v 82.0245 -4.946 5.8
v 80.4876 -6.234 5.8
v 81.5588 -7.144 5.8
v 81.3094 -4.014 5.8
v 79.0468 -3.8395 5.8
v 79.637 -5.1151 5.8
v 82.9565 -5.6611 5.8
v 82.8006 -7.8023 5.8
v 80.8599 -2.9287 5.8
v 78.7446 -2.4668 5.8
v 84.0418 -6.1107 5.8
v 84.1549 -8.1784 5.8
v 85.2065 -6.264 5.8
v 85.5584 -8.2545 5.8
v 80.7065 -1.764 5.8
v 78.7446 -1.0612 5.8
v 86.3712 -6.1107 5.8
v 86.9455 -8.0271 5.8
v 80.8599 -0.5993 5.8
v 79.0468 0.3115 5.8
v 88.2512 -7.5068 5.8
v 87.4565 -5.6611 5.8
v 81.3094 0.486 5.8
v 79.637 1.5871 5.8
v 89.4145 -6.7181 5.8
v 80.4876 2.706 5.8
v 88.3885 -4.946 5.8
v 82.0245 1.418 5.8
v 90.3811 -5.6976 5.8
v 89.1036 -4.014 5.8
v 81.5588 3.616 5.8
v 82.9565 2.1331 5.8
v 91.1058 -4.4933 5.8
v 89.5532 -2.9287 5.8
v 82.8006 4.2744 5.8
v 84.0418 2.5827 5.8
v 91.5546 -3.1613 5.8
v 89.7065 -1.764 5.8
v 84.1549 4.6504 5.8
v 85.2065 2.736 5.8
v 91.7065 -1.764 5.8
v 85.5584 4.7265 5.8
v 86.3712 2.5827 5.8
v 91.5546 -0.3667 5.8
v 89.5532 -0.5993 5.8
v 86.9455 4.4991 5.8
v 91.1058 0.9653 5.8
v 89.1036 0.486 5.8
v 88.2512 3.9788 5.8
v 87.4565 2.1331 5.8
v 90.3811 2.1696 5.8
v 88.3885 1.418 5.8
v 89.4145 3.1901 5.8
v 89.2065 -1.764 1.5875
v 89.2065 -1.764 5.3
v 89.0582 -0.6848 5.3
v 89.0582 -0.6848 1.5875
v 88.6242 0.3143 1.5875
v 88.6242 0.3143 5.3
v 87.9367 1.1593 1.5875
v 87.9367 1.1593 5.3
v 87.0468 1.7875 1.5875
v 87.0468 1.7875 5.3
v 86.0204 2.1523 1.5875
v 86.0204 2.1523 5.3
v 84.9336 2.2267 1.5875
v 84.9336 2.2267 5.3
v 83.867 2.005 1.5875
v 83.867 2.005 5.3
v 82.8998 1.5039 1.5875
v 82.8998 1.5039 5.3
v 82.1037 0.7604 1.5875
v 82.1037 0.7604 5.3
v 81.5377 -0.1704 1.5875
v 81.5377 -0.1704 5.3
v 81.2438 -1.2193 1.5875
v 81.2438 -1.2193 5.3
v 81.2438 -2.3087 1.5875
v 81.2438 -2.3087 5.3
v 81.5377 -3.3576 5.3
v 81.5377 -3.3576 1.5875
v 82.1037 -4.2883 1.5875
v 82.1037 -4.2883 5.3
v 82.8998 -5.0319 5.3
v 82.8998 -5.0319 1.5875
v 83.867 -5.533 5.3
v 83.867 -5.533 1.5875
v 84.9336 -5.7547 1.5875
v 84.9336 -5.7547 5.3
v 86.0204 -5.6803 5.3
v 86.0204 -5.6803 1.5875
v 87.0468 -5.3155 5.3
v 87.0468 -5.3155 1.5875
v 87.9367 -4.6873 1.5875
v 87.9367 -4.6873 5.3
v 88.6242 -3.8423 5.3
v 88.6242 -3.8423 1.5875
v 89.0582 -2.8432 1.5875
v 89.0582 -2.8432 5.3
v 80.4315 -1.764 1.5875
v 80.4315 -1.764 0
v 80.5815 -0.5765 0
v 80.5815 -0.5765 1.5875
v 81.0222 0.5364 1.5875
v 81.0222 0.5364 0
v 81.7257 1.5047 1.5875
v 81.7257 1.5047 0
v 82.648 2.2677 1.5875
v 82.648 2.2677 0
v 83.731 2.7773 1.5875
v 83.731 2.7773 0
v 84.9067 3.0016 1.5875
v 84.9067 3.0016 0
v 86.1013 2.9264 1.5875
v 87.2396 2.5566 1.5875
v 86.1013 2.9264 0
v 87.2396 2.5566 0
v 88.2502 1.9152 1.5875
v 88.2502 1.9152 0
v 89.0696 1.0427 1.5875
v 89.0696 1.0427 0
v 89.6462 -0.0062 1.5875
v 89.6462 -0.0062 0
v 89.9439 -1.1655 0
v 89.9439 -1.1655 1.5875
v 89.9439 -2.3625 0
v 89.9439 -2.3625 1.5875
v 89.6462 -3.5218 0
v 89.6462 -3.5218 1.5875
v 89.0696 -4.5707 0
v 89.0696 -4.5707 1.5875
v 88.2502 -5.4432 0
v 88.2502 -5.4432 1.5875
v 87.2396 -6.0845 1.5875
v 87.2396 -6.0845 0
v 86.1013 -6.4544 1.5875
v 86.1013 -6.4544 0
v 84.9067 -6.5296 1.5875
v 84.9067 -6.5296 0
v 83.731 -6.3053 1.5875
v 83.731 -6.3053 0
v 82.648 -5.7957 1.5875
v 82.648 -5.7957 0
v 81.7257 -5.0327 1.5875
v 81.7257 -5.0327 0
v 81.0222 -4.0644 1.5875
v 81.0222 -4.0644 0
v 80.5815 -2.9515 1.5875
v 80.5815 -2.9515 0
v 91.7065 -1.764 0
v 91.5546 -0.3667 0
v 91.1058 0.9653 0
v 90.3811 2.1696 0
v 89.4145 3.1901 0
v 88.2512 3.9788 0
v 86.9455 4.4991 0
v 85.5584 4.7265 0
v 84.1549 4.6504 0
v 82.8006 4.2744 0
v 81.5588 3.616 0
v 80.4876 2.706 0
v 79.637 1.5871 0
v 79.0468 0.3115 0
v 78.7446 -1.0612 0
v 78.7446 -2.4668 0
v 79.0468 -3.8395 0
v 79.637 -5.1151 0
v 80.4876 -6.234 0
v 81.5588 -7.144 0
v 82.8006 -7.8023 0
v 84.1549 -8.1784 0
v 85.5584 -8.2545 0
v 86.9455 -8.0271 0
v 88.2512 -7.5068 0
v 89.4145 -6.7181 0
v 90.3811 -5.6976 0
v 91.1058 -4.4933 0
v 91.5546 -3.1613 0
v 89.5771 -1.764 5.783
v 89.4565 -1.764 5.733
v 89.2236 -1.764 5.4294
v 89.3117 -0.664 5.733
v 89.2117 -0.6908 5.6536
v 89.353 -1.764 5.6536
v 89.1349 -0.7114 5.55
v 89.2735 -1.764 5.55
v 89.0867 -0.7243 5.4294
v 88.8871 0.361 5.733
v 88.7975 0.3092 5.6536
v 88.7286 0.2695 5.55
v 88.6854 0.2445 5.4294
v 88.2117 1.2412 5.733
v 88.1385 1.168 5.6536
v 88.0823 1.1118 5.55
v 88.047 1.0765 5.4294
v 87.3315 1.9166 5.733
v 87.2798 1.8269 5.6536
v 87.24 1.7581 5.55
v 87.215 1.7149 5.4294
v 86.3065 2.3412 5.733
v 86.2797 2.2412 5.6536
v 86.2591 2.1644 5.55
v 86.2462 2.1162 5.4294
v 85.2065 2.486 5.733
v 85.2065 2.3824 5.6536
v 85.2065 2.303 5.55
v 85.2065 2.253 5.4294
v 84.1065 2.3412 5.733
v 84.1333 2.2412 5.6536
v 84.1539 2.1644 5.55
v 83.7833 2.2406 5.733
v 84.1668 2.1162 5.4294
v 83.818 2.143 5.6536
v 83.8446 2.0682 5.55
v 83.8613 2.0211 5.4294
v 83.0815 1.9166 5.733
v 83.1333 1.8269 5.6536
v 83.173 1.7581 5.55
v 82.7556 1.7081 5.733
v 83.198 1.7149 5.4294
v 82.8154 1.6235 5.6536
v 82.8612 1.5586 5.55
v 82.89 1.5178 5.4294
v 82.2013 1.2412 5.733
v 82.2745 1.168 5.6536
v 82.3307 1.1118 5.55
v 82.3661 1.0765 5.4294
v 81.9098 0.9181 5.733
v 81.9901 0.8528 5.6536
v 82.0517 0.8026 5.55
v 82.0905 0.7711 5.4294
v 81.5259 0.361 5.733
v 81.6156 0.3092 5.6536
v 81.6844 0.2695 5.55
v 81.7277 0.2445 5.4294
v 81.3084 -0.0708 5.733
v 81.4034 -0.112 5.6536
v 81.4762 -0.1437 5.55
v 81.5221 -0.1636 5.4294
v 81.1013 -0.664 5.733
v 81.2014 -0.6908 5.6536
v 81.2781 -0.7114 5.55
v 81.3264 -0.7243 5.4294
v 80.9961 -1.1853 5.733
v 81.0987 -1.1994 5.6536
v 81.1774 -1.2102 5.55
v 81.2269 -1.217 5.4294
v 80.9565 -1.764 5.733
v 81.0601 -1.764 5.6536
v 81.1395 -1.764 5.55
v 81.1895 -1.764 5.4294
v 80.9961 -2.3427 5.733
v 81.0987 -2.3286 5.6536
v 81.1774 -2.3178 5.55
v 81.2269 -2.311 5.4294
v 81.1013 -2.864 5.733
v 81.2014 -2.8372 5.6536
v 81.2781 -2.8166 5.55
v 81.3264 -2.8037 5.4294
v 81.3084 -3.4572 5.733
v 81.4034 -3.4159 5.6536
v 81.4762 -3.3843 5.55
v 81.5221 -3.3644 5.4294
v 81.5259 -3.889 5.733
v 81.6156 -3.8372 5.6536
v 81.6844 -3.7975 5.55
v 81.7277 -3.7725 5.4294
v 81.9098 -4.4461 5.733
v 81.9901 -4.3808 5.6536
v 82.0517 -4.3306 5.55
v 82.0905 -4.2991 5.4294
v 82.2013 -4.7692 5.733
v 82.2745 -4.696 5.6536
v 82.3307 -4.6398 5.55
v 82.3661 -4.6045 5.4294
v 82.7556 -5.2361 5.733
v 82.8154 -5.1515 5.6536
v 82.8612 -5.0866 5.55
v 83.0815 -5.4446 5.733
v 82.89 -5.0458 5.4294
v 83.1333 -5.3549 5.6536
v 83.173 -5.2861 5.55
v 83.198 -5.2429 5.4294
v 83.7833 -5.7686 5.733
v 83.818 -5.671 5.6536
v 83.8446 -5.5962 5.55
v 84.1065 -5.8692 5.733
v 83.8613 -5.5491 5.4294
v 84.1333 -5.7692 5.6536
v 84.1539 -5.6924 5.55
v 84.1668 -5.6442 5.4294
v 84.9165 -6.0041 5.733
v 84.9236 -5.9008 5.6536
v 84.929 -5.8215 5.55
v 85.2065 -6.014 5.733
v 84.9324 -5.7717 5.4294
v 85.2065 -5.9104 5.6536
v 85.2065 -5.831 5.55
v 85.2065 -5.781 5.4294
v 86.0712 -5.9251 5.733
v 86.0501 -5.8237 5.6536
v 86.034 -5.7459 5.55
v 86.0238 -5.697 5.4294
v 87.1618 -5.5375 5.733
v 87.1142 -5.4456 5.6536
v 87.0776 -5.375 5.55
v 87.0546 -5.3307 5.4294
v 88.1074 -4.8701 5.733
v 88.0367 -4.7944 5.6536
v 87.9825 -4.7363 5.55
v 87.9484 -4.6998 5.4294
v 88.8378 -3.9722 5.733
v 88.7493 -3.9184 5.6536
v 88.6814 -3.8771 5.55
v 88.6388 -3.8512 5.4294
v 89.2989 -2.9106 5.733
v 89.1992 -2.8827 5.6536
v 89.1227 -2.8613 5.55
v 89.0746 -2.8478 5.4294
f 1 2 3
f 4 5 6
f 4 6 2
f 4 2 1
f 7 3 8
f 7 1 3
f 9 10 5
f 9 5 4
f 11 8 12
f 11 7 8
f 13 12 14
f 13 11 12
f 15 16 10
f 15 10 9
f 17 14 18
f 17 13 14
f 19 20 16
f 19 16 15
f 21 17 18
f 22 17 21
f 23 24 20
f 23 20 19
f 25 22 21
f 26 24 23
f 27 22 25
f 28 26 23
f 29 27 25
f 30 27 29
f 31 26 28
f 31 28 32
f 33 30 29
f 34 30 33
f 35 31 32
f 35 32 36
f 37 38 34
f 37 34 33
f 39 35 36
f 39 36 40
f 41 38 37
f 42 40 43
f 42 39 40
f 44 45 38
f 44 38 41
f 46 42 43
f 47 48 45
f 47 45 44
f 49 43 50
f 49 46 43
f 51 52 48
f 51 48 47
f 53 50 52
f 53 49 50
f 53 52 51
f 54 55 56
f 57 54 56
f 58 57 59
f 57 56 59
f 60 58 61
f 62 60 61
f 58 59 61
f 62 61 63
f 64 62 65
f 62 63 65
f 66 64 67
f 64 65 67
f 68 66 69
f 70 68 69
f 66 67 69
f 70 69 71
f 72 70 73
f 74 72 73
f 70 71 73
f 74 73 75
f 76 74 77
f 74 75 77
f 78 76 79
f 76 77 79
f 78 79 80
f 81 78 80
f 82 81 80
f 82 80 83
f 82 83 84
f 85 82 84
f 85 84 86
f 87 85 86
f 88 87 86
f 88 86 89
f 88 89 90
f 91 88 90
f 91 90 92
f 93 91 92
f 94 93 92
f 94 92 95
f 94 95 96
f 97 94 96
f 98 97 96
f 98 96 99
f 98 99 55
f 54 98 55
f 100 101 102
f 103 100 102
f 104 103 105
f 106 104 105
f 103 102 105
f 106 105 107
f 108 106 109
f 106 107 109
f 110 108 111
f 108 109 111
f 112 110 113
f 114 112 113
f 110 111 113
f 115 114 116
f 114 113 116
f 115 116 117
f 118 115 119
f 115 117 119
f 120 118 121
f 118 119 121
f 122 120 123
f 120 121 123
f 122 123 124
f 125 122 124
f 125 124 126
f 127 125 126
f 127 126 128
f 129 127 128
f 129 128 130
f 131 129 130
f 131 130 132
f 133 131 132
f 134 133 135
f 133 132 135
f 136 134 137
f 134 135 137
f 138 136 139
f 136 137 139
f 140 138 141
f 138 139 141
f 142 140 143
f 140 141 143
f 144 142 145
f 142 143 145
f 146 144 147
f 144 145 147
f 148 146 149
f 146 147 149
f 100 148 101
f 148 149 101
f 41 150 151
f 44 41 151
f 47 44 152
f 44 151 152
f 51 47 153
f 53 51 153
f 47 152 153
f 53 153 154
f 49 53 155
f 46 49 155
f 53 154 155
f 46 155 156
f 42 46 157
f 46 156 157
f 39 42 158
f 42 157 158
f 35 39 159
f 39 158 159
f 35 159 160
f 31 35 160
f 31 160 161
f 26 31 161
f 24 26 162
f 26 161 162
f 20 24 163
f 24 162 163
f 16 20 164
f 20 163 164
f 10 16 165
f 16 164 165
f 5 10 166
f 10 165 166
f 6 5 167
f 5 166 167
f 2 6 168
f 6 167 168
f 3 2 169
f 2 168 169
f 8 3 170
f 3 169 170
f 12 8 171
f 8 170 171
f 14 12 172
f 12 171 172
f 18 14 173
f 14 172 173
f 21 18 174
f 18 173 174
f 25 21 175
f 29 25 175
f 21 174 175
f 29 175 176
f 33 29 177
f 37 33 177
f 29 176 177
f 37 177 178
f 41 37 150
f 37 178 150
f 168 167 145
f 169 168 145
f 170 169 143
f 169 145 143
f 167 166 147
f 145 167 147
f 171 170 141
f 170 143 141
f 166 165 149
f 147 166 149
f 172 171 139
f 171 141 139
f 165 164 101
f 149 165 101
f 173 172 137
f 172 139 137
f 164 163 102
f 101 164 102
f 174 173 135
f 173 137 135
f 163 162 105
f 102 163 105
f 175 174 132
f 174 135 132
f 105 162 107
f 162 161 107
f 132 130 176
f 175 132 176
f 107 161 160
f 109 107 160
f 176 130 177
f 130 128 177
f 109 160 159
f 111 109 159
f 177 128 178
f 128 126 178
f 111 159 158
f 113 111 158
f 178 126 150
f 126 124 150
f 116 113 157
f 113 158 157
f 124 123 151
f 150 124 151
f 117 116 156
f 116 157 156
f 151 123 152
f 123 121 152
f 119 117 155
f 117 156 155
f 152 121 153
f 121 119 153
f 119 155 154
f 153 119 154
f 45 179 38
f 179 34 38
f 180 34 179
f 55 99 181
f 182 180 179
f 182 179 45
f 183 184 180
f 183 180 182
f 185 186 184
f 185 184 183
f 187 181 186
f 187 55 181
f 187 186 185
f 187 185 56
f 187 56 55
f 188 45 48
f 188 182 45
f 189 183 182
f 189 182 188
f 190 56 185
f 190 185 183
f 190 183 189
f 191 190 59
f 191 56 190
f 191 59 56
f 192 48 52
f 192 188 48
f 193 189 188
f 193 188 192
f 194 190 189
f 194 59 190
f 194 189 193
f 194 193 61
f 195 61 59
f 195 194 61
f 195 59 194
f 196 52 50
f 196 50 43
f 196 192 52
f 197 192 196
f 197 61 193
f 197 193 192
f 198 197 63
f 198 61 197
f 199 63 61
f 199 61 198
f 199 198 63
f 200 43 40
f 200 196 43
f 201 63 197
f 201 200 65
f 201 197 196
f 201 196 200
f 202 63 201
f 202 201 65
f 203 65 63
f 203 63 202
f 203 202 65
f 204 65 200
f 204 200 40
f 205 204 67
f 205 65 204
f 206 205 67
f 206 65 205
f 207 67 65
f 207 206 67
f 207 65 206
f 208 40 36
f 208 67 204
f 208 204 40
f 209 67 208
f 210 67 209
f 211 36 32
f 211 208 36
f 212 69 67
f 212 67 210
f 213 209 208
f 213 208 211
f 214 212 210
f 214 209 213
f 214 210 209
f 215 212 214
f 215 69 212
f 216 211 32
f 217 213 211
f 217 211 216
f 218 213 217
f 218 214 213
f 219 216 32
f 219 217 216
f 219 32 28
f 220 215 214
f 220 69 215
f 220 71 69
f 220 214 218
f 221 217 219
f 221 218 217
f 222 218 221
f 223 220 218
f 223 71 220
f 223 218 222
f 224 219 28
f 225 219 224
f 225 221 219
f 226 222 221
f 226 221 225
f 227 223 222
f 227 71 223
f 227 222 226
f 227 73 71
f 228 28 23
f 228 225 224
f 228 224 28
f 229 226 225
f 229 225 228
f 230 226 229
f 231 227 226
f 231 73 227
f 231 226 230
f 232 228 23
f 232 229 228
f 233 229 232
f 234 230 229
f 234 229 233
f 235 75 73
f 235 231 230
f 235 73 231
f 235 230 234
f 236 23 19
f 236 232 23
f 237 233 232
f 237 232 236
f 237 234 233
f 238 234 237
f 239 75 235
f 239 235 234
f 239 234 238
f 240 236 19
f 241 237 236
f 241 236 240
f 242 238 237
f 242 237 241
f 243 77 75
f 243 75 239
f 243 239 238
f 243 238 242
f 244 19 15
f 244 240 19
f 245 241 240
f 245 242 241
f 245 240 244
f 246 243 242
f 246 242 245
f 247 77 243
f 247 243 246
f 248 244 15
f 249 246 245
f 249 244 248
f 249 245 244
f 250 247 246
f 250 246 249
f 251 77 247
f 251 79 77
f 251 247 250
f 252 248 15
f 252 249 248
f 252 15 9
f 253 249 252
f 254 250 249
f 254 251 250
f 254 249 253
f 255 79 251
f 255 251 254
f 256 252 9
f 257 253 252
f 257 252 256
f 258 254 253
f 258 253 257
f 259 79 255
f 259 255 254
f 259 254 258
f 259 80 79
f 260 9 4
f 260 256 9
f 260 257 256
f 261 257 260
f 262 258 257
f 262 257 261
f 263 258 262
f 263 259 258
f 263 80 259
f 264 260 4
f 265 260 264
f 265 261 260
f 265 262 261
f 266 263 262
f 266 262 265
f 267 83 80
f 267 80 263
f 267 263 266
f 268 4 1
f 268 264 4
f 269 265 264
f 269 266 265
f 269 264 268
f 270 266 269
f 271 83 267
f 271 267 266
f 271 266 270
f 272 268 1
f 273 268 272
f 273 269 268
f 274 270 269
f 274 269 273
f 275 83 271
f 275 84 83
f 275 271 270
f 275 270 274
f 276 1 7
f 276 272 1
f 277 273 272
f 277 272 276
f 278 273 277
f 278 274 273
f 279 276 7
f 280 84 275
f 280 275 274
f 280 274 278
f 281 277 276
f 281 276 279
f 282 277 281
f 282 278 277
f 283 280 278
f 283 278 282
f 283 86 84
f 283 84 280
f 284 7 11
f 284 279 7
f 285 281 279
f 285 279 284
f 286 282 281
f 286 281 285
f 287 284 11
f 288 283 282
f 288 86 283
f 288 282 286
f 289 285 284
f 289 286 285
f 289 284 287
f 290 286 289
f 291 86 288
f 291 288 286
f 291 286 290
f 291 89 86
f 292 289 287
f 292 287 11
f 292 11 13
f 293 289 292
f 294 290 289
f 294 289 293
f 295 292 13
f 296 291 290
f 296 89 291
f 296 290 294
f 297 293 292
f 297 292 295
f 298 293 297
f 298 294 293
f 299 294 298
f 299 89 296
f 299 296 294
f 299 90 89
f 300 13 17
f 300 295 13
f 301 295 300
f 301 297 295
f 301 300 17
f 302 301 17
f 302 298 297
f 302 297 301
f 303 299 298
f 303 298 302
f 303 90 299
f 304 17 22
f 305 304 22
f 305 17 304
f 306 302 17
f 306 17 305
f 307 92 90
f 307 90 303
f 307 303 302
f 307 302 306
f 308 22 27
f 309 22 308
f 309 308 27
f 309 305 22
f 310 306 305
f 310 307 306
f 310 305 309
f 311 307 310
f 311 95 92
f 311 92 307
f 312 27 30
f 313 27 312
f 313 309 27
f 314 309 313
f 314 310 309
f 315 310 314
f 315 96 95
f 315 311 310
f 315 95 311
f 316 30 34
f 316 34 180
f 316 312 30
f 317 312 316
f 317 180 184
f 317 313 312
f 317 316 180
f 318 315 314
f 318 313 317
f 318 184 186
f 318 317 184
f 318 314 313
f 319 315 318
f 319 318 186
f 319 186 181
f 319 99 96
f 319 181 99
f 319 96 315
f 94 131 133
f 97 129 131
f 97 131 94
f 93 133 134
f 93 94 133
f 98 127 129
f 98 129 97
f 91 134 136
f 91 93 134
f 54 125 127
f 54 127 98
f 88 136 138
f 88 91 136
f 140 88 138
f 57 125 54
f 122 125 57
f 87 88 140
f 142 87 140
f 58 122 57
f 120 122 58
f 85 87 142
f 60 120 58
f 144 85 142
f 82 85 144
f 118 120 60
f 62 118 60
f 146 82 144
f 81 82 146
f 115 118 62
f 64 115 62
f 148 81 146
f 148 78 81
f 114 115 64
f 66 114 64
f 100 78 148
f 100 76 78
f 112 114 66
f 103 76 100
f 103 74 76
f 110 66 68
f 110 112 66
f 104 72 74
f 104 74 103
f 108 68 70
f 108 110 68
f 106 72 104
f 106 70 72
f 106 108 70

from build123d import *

# Parameters (mm, degrees)
SKETCH1_R           = 6.5
BOSS_EXTRUDE1_DEPTH = 5.8
SKETCH2_R           = 4
CUT_EXTRUDE1_DEPTH  = 93.260613645
FILLET1_R           = 0.5
SKETCH3_R           = 4.775
CUT_EXTRUDE2_DEPTH  = 1.5875


with BuildPart() as part:
    # Sketch1 → Boss-Extrude1 (new body)
    with BuildSketch(Plane.XY):
        with Locations((85.206527413, -1.763997815)):
            Circle(SKETCH1_R)
    extrude(amount=BOSS_EXTRUDE1_DEPTH)

    # Sketch2 → Cut-Extrude1 (cut, through all)
    with BuildSketch(Plane.XY.offset(5.8)):
        with Locations((85.206527413, -1.763997815)):
            Circle(SKETCH2_R)
    extrude(amount=-CUT_EXTRUDE1_DEPTH, mode=Mode.SUBTRACT)

    # Fillet1
    fillet1_edges = [part.edges().sort_by_distance(p)[0] for p in [
        (81.206527413, -1.763997815, 5.8),
    ]]
    fillet(fillet1_edges, radius=FILLET1_R)

    # Sketch3 → Cut-Extrude2 (cut)
    with BuildSketch(Plane(origin=(0, 0, 0), x_dir=(-1, 0, 0), z_dir=(0, 0, -1))):
        with Locations((-85.206527413, -1.763997815)):
            Circle(SKETCH3_R)
    extrude(amount=-CUT_EXTRUDE2_DEPTH, mode=Mode.SUBTRACT)


solid = part.part
